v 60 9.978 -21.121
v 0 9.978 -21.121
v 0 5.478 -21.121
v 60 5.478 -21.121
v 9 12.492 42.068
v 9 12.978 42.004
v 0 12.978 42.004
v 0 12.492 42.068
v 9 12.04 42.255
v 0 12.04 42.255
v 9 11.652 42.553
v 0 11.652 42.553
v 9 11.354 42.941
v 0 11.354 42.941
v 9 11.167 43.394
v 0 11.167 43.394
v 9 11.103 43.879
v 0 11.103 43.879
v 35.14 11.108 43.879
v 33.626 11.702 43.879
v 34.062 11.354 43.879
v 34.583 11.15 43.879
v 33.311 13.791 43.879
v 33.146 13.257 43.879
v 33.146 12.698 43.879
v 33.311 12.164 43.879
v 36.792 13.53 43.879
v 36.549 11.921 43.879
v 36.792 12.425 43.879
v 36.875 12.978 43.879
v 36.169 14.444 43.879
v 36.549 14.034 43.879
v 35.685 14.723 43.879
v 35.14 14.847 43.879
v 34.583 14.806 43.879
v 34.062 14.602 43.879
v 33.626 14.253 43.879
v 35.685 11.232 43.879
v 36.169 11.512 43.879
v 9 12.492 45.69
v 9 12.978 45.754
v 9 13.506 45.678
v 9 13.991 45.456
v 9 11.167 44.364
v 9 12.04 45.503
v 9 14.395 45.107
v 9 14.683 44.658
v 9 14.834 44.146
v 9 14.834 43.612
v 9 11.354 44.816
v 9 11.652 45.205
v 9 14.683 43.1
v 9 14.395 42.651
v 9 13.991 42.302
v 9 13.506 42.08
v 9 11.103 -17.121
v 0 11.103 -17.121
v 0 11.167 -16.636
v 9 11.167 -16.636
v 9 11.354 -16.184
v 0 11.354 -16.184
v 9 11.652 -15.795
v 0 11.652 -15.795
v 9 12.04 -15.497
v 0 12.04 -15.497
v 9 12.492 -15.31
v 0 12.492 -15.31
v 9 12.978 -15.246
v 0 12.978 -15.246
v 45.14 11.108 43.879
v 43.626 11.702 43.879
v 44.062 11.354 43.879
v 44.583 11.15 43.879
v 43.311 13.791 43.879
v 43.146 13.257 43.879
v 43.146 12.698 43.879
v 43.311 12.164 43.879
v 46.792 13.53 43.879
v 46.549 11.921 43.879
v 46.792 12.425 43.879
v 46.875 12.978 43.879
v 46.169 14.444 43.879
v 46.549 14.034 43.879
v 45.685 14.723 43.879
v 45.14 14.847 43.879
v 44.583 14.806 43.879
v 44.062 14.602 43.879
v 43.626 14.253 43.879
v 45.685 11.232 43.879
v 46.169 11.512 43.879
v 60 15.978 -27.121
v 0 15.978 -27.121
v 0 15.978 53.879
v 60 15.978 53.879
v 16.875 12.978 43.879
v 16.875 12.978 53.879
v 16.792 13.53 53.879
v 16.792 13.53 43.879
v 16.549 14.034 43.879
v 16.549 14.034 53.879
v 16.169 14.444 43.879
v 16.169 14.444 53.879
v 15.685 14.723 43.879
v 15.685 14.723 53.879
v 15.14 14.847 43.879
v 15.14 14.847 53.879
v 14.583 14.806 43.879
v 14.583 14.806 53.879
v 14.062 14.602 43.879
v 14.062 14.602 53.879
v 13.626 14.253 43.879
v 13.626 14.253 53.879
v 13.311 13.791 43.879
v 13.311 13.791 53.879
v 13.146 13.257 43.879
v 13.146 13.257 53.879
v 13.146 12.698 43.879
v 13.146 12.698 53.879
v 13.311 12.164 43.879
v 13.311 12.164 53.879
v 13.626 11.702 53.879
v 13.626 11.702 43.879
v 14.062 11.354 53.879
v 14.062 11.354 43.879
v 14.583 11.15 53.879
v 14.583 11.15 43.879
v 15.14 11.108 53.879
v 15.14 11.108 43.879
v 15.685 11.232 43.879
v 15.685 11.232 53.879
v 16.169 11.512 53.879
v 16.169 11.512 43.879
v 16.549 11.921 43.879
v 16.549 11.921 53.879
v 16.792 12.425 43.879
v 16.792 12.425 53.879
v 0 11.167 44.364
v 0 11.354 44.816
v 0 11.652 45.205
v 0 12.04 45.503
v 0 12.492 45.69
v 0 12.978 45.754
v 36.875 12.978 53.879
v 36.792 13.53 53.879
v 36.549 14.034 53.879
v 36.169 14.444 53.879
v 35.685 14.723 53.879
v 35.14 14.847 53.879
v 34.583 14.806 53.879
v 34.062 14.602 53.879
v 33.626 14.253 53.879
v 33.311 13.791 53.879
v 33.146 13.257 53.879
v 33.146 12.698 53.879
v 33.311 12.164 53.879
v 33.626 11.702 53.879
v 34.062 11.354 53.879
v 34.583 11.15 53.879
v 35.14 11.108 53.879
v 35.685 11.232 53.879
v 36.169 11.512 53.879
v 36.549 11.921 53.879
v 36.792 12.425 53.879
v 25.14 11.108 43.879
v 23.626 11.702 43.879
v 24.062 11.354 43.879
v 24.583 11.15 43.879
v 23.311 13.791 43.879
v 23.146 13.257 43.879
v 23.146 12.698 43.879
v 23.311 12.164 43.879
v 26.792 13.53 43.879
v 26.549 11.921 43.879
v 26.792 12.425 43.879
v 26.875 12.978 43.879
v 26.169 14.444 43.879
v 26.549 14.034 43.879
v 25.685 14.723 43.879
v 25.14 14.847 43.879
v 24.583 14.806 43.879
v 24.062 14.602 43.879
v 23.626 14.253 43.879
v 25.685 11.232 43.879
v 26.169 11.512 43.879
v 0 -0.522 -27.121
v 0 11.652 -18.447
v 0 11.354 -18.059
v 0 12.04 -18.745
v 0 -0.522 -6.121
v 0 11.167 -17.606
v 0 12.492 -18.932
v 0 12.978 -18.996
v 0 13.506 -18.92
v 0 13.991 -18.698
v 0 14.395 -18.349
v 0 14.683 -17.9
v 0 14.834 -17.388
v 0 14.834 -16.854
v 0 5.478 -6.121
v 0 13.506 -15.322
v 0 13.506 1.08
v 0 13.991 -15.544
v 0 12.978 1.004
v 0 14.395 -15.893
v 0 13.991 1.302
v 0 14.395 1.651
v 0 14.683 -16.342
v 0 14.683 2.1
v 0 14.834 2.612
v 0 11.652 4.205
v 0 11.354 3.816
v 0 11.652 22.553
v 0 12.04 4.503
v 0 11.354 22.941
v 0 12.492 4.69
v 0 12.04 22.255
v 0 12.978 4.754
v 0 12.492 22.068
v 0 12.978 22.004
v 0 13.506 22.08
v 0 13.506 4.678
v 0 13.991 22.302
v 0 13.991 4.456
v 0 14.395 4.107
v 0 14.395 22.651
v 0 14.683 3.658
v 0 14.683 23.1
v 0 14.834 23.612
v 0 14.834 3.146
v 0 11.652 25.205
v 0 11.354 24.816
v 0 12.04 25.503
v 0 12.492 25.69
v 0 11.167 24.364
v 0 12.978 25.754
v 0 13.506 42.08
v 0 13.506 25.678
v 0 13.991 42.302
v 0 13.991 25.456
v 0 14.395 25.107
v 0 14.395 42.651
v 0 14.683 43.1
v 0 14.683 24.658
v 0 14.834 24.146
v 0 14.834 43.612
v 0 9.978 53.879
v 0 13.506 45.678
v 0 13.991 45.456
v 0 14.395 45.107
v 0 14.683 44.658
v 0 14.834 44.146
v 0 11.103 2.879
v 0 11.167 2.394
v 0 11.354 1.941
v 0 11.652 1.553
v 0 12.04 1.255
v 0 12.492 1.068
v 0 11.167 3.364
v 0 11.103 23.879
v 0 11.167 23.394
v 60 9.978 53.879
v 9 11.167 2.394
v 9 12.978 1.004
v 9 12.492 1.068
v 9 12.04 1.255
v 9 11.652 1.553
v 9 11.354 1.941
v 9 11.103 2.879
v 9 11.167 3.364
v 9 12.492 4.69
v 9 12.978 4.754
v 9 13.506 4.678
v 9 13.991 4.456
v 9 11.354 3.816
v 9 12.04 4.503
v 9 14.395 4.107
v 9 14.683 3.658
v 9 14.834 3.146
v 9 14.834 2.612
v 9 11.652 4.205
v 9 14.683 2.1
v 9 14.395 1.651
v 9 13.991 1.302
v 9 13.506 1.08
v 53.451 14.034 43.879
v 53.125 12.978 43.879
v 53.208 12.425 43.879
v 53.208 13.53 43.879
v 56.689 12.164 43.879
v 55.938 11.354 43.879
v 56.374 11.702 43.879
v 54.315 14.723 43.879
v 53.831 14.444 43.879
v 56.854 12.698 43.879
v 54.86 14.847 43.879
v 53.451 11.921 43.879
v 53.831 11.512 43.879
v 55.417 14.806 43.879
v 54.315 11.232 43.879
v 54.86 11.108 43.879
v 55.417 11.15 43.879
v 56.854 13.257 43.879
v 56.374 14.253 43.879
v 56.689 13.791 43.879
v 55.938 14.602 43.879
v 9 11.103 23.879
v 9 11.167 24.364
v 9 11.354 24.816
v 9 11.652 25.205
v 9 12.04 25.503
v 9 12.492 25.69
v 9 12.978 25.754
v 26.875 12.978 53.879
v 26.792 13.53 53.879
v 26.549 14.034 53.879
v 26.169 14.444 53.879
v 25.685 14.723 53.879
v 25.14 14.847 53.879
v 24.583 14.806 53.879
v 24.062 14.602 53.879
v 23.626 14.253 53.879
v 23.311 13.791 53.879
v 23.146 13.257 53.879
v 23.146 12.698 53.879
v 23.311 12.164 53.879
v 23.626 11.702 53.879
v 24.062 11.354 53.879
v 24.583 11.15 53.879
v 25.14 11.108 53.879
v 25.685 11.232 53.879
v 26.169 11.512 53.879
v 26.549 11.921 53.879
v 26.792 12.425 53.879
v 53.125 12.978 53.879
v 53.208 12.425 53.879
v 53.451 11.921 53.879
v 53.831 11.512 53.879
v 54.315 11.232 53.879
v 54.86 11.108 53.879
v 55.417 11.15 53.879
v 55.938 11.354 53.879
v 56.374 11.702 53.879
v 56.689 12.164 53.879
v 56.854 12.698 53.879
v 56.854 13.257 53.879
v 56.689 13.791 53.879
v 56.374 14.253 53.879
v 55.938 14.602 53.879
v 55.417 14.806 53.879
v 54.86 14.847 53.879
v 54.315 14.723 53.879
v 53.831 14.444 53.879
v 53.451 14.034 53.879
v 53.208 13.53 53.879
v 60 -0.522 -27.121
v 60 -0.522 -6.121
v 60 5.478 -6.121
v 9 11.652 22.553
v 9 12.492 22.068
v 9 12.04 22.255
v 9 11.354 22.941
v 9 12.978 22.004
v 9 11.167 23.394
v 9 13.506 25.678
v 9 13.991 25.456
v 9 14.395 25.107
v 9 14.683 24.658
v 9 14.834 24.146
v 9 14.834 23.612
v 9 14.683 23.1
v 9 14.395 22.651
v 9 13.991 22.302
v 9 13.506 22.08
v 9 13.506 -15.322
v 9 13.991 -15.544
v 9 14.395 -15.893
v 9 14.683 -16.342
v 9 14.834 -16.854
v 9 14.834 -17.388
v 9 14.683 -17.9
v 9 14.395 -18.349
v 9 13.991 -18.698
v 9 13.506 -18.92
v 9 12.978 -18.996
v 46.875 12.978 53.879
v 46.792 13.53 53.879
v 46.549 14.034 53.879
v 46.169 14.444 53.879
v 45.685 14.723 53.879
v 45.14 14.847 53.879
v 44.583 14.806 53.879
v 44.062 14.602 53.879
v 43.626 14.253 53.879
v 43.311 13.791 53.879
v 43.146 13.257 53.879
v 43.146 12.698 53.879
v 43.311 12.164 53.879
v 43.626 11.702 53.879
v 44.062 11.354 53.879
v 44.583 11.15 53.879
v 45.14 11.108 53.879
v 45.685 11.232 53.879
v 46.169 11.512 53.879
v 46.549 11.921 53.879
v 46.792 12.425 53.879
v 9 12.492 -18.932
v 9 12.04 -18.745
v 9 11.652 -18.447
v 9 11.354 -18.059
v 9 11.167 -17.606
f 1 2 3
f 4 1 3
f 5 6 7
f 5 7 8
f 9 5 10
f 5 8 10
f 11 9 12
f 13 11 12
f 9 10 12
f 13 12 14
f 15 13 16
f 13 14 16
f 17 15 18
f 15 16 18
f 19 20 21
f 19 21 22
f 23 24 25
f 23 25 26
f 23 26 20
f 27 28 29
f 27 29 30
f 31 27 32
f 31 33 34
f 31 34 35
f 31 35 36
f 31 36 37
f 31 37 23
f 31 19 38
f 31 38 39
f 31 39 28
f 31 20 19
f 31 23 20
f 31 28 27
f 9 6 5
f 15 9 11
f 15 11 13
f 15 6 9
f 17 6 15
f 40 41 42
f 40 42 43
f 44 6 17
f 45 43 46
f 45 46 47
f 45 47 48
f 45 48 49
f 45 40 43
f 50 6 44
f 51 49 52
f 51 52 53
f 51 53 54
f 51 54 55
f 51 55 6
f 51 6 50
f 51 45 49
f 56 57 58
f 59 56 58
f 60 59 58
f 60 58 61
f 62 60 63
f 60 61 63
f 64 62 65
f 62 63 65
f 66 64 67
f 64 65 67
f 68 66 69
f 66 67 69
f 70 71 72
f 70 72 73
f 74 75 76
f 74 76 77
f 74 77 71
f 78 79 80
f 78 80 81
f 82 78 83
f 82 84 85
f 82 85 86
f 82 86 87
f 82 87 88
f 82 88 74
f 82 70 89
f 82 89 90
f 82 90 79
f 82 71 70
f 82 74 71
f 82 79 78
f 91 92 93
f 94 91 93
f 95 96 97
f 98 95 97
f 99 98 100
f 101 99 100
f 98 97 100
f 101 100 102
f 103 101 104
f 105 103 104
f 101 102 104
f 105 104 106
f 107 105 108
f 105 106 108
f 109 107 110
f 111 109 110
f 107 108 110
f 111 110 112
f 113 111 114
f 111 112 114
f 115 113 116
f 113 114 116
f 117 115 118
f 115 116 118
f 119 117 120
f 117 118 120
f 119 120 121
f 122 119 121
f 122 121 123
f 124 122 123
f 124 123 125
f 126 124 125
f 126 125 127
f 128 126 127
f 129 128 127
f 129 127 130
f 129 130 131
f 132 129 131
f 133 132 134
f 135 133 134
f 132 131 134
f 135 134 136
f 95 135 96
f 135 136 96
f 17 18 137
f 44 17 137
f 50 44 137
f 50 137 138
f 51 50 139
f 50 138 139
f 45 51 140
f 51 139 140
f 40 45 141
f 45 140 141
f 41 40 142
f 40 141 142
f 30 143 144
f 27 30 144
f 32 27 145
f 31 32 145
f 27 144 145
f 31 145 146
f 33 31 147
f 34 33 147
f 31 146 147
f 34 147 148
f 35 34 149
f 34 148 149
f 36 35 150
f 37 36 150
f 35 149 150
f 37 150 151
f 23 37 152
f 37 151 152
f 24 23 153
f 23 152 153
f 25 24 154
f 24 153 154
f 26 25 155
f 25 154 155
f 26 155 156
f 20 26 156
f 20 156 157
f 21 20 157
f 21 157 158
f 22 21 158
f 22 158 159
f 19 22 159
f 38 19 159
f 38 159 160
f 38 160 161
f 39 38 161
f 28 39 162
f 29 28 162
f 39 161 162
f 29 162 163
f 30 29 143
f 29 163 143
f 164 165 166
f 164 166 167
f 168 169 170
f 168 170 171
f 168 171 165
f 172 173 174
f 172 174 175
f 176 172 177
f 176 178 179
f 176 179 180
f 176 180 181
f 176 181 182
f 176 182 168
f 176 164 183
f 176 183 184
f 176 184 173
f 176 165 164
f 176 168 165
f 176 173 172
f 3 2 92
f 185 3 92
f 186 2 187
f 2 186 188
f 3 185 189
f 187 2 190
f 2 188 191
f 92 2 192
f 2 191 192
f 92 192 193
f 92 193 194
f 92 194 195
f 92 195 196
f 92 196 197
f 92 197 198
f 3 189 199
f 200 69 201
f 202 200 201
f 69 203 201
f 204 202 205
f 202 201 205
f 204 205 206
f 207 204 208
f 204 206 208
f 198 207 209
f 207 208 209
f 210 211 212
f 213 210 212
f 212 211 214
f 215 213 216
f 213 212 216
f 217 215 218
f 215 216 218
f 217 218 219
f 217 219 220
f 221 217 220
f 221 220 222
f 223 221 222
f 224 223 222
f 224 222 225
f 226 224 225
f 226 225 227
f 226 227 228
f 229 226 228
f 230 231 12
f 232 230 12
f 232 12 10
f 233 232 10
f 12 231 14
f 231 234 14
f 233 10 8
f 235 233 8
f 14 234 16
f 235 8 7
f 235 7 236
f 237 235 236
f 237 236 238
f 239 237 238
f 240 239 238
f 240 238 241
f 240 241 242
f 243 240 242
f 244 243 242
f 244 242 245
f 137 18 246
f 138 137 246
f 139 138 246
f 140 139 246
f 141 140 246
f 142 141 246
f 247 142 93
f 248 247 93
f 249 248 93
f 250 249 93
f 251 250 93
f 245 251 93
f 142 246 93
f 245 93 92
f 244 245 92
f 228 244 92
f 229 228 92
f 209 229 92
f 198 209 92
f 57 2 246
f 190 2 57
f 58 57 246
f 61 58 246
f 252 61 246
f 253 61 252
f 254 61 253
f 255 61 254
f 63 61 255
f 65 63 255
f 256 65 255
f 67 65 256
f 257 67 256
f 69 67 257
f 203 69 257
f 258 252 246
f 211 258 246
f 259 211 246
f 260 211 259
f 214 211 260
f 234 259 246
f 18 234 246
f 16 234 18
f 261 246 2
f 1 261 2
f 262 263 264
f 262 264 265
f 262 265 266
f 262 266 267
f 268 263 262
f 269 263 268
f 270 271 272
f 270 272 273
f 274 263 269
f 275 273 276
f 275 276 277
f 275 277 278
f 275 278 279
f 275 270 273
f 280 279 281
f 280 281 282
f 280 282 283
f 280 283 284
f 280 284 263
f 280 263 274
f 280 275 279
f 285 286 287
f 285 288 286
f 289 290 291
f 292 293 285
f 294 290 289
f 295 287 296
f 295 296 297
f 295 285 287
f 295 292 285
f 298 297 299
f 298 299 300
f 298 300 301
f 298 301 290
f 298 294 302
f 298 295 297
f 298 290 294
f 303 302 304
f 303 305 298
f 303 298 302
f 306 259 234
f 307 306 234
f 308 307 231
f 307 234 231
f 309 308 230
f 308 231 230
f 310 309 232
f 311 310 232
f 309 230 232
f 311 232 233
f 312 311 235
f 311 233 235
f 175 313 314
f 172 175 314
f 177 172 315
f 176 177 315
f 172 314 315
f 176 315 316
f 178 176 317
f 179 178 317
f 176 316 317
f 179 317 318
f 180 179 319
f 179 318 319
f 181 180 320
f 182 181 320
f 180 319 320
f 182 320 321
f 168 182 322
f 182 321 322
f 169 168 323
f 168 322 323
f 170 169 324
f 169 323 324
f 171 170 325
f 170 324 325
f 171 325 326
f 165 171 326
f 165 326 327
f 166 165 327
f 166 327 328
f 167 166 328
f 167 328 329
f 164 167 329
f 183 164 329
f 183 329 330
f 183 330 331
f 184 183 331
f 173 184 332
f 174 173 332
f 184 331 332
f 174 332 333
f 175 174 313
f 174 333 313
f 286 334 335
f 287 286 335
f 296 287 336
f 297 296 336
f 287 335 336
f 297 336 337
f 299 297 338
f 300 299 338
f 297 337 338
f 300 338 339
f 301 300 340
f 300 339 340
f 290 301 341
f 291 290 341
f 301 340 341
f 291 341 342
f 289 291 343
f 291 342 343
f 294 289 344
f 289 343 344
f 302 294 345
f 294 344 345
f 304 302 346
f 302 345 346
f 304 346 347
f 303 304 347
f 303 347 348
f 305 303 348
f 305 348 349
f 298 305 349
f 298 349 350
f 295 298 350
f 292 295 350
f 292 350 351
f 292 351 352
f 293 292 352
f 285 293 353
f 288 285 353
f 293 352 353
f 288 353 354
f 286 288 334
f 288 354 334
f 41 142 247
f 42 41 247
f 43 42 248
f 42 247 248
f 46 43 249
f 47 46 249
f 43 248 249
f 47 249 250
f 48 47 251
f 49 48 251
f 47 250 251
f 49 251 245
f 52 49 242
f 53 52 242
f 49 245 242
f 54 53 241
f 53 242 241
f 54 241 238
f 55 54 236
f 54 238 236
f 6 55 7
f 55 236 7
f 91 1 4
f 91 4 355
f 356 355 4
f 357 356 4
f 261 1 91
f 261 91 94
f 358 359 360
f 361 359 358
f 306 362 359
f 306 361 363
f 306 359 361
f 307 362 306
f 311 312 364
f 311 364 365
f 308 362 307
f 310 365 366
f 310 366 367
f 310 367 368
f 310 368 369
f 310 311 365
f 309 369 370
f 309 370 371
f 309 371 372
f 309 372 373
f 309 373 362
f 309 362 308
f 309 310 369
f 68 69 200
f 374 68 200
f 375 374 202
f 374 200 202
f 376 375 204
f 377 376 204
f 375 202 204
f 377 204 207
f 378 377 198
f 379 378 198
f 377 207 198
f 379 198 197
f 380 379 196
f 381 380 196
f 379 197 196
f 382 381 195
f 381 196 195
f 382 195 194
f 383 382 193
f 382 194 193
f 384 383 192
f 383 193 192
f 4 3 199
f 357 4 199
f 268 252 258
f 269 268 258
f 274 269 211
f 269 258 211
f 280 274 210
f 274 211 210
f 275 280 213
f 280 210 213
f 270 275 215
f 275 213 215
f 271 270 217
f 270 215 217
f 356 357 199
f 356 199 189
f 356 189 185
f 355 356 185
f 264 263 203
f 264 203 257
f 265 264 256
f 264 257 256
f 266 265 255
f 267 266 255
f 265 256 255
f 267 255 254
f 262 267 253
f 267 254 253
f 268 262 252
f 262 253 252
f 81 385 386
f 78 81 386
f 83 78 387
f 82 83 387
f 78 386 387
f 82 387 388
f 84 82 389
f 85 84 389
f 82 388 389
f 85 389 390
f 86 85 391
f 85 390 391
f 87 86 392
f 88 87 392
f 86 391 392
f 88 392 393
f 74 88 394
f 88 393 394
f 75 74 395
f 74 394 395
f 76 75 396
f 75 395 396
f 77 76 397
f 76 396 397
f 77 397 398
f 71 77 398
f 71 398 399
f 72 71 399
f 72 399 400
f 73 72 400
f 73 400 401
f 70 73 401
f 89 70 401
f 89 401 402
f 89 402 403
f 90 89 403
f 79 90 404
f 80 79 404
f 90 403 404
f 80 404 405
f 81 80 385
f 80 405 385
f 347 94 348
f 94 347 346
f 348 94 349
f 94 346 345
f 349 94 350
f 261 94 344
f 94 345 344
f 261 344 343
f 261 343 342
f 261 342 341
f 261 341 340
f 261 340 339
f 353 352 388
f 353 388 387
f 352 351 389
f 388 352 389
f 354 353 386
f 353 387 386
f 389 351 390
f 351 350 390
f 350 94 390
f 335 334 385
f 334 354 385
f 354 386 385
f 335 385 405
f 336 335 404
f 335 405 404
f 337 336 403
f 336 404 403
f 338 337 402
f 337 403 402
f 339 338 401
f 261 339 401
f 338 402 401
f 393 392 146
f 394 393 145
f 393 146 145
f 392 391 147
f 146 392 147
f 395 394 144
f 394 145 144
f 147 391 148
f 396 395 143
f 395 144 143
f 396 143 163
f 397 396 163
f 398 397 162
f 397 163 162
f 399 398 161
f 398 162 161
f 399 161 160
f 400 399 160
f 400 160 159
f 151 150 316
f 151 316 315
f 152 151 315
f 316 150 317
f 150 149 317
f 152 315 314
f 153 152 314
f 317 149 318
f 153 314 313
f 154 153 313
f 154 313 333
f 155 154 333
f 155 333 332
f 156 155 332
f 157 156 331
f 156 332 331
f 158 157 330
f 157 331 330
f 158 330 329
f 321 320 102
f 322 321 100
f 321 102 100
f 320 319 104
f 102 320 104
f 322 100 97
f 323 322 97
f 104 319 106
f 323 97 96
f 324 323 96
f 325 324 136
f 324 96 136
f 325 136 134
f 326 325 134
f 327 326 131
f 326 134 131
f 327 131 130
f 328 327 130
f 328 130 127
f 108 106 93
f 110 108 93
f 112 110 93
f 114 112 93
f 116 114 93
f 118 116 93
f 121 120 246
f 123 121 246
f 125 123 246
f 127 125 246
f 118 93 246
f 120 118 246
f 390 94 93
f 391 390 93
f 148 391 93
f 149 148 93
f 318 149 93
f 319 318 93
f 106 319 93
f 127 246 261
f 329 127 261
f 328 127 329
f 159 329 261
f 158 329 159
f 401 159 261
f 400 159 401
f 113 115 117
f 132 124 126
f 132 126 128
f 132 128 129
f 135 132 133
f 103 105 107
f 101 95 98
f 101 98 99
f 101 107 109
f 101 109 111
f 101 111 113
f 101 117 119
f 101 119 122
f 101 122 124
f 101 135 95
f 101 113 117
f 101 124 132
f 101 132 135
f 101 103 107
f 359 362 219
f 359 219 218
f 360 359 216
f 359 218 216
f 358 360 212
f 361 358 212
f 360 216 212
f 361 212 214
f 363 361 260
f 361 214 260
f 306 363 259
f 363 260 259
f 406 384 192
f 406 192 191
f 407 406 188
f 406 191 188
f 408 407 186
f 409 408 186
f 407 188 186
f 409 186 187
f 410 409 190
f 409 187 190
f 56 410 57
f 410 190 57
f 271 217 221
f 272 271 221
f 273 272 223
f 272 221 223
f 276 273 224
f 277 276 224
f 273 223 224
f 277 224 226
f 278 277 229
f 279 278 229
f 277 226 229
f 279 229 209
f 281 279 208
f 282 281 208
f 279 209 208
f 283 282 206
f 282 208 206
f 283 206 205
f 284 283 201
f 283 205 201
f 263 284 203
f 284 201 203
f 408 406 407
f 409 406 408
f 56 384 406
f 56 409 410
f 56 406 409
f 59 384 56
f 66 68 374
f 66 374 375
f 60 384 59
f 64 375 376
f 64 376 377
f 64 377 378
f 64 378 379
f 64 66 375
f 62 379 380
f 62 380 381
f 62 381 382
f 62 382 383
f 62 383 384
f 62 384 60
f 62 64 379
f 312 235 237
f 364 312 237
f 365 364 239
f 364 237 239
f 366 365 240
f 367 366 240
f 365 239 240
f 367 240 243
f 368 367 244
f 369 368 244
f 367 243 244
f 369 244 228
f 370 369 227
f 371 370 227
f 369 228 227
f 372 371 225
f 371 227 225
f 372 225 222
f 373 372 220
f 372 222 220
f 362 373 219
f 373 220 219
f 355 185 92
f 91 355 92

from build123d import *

# Parameters (mm, degrees)
F1_DEPTH = 60
F3_DEPTH = 9
F4_R     = 1.875
F5_DEPTH = 10


with BuildPart() as f1:
    # F0 (on Right) → F1 (new body)
    with BuildSketch(Plane.YZ):
        Polygon((-0.522294, -6.121146), (-0.522294, -27.121146), (15.977706, -27.121146), (15.977706, 53.878854), (9.977706, 53.878854), (9.977706, -21.121146), (5.477706, -21.121146), (5.477706, -6.121146), align=None)
    extrude(amount=F1_DEPTH)

    # F2 (on face) → F3 (cut)
    with BuildSketch(Plane(origin=(0, 0, 0), x_dir=(0, -1, 0), z_dir=(-1, 0, 0))):
        with BuildLine():
            Line((-12.977706, 43.878854), (-12.977706, 45.753854))
            ThreePointArc((-12.977706, 45.753854), (-14.852706, 43.878854), (-12.977706, 42.003854))
            Line((-12.977706, 42.003854), (-12.977706, 43.878854))
        make_face()
        with BuildLine():
            ThreePointArc((-12.977706, 42.003854), (-11.651881, 42.553028), (-11.102706, 43.878854))
            ThreePointArc((-11.102706, 43.878854), (-11.651881, 45.204679), (-12.977706, 45.753854))
            Line((-12.977706, 45.753854), (-12.977706, 43.878854))
            Line((-12.977706, 43.878854), (-12.977706, 42.003854))
        make_face()
        with BuildLine():
            Line((-12.977706, 23.878854), (-12.977706, 25.753854))
            ThreePointArc((-12.977706, 25.753854), (-14.852706, 23.878854), (-12.977706, 22.003854))
            Line((-12.977706, 22.003854), (-12.977706, 23.878854))
        make_face()
        with BuildLine():
            ThreePointArc((-11.102706, 23.878854), (-11.651881, 25.204679), (-12.977706, 25.753854))
            Line((-12.977706, 25.753854), (-12.977706, 23.878854))
            Line((-12.977706, 23.878854), (-12.977706, 22.003854))
            ThreePointArc((-12.977706, 22.003854), (-11.651881, 22.553028), (-11.102706, 23.878854))
        make_face()
        with BuildLine():
            Line((-12.977706, 2.878854), (-12.977706, 4.753854))
            ThreePointArc((-12.977706, 4.753854), (-14.852706, 2.878854), (-12.977706, 1.003854))
            Line((-12.977706, 1.003854), (-12.977706, 2.878854))
        make_face()
        with BuildLine():
            ThreePointArc((-11.102706, 2.878854), (-11.651881, 4.204679), (-12.977706, 4.753854))
            Line((-12.977706, 4.753854), (-12.977706, 2.878854))
            Line((-12.977706, 2.878854), (-12.977706, 1.003854))
            ThreePointArc((-12.977706, 1.003854), (-11.651881, 1.553028), (-11.102706, 2.878854))
        make_face()
        with BuildLine():
            Line((-12.977706, -17.121146), (-12.977706, -15.246146))
            ThreePointArc((-12.977706, -15.246146), (-14.852706, -17.121146), (-12.977706, -18.996146))
            Line((-12.977706, -18.996146), (-12.977706, -17.121146))
        make_face()
        with BuildLine():
            ThreePointArc((-11.102706, -17.121146), (-11.651881, -15.795321), (-12.977706, -15.246146))
            Line((-12.977706, -15.246146), (-12.977706, -17.121146))
            Line((-12.977706, -17.121146), (-12.977706, -18.996146))
            ThreePointArc((-12.977706, -18.996146), (-11.651881, -18.446972), (-11.102706, -17.121146))
        make_face()
    extrude(amount=-F3_DEPTH, mode=Mode.SUBTRACT)

    # F4 (on face) → F5 (cut)
    with BuildSketch(Plane.XY.offset(53.878854)):
        with BuildLine():
            ThreePointArc((43.125, 12.977706), (45, 11.102706), (46.875, 12.977706))
            Line((46.875, 12.977706), (45, 12.977706))
            Line((45, 12.977706), (43.125, 12.977706))
        make_face()
        with BuildLine():
            ThreePointArc((56.875, 12.977706), (55, 14.852706), (53.125, 12.977706))
            Line((53.125, 12.977706), (55, 12.977706))
            Line((55, 12.977706), (56.875, 12.977706))
        make_face()
        with BuildLine():
            Line((55, 12.977706), (53.125, 12.977706))
            ThreePointArc((53.125, 12.977706), (55, 11.102706), (56.875, 12.977706))
            Line((56.875, 12.977706), (55, 12.977706))
        make_face()
        with BuildLine():
            Line((45, 12.977706), (46.875, 12.977706))
            ThreePointArc((46.875, 12.977706), (45, 14.852706), (43.125, 12.977706))
            Line((43.125, 12.977706), (45, 12.977706))
        make_face()
        with Locations((15, 12.977706)):
            Circle(F4_R)
        with BuildLine():
            ThreePointArc((23.125, 12.977706), (25, 11.102706), (26.875, 12.977706))
            Line((26.875, 12.977706), (25, 12.977706))
            Line((25, 12.977706), (23.125, 12.977706))
        make_face()
        with BuildLine():
            Line((25, 12.977706), (26.875, 12.977706))
            ThreePointArc((26.875, 12.977706), (25, 14.852706), (23.125, 12.977706))
            Line((23.125, 12.977706), (25, 12.977706))
        make_face()
        with BuildLine():
            ThreePointArc((33.125, 12.977706), (35, 11.102706), (36.875, 12.977706))
            Line((36.875, 12.977706), (35, 12.977706))
            Line((35, 12.977706), (33.125, 12.977706))
        make_face()
        with BuildLine():
            Line((35, 12.977706), (36.875, 12.977706))
            ThreePointArc((36.875, 12.977706), (35, 14.852706), (33.125, 12.977706))
            Line((33.125, 12.977706), (35, 12.977706))
        make_face()
    extrude(amount=-F5_DEPTH, mode=Mode.SUBTRACT)


solid = f1.part
